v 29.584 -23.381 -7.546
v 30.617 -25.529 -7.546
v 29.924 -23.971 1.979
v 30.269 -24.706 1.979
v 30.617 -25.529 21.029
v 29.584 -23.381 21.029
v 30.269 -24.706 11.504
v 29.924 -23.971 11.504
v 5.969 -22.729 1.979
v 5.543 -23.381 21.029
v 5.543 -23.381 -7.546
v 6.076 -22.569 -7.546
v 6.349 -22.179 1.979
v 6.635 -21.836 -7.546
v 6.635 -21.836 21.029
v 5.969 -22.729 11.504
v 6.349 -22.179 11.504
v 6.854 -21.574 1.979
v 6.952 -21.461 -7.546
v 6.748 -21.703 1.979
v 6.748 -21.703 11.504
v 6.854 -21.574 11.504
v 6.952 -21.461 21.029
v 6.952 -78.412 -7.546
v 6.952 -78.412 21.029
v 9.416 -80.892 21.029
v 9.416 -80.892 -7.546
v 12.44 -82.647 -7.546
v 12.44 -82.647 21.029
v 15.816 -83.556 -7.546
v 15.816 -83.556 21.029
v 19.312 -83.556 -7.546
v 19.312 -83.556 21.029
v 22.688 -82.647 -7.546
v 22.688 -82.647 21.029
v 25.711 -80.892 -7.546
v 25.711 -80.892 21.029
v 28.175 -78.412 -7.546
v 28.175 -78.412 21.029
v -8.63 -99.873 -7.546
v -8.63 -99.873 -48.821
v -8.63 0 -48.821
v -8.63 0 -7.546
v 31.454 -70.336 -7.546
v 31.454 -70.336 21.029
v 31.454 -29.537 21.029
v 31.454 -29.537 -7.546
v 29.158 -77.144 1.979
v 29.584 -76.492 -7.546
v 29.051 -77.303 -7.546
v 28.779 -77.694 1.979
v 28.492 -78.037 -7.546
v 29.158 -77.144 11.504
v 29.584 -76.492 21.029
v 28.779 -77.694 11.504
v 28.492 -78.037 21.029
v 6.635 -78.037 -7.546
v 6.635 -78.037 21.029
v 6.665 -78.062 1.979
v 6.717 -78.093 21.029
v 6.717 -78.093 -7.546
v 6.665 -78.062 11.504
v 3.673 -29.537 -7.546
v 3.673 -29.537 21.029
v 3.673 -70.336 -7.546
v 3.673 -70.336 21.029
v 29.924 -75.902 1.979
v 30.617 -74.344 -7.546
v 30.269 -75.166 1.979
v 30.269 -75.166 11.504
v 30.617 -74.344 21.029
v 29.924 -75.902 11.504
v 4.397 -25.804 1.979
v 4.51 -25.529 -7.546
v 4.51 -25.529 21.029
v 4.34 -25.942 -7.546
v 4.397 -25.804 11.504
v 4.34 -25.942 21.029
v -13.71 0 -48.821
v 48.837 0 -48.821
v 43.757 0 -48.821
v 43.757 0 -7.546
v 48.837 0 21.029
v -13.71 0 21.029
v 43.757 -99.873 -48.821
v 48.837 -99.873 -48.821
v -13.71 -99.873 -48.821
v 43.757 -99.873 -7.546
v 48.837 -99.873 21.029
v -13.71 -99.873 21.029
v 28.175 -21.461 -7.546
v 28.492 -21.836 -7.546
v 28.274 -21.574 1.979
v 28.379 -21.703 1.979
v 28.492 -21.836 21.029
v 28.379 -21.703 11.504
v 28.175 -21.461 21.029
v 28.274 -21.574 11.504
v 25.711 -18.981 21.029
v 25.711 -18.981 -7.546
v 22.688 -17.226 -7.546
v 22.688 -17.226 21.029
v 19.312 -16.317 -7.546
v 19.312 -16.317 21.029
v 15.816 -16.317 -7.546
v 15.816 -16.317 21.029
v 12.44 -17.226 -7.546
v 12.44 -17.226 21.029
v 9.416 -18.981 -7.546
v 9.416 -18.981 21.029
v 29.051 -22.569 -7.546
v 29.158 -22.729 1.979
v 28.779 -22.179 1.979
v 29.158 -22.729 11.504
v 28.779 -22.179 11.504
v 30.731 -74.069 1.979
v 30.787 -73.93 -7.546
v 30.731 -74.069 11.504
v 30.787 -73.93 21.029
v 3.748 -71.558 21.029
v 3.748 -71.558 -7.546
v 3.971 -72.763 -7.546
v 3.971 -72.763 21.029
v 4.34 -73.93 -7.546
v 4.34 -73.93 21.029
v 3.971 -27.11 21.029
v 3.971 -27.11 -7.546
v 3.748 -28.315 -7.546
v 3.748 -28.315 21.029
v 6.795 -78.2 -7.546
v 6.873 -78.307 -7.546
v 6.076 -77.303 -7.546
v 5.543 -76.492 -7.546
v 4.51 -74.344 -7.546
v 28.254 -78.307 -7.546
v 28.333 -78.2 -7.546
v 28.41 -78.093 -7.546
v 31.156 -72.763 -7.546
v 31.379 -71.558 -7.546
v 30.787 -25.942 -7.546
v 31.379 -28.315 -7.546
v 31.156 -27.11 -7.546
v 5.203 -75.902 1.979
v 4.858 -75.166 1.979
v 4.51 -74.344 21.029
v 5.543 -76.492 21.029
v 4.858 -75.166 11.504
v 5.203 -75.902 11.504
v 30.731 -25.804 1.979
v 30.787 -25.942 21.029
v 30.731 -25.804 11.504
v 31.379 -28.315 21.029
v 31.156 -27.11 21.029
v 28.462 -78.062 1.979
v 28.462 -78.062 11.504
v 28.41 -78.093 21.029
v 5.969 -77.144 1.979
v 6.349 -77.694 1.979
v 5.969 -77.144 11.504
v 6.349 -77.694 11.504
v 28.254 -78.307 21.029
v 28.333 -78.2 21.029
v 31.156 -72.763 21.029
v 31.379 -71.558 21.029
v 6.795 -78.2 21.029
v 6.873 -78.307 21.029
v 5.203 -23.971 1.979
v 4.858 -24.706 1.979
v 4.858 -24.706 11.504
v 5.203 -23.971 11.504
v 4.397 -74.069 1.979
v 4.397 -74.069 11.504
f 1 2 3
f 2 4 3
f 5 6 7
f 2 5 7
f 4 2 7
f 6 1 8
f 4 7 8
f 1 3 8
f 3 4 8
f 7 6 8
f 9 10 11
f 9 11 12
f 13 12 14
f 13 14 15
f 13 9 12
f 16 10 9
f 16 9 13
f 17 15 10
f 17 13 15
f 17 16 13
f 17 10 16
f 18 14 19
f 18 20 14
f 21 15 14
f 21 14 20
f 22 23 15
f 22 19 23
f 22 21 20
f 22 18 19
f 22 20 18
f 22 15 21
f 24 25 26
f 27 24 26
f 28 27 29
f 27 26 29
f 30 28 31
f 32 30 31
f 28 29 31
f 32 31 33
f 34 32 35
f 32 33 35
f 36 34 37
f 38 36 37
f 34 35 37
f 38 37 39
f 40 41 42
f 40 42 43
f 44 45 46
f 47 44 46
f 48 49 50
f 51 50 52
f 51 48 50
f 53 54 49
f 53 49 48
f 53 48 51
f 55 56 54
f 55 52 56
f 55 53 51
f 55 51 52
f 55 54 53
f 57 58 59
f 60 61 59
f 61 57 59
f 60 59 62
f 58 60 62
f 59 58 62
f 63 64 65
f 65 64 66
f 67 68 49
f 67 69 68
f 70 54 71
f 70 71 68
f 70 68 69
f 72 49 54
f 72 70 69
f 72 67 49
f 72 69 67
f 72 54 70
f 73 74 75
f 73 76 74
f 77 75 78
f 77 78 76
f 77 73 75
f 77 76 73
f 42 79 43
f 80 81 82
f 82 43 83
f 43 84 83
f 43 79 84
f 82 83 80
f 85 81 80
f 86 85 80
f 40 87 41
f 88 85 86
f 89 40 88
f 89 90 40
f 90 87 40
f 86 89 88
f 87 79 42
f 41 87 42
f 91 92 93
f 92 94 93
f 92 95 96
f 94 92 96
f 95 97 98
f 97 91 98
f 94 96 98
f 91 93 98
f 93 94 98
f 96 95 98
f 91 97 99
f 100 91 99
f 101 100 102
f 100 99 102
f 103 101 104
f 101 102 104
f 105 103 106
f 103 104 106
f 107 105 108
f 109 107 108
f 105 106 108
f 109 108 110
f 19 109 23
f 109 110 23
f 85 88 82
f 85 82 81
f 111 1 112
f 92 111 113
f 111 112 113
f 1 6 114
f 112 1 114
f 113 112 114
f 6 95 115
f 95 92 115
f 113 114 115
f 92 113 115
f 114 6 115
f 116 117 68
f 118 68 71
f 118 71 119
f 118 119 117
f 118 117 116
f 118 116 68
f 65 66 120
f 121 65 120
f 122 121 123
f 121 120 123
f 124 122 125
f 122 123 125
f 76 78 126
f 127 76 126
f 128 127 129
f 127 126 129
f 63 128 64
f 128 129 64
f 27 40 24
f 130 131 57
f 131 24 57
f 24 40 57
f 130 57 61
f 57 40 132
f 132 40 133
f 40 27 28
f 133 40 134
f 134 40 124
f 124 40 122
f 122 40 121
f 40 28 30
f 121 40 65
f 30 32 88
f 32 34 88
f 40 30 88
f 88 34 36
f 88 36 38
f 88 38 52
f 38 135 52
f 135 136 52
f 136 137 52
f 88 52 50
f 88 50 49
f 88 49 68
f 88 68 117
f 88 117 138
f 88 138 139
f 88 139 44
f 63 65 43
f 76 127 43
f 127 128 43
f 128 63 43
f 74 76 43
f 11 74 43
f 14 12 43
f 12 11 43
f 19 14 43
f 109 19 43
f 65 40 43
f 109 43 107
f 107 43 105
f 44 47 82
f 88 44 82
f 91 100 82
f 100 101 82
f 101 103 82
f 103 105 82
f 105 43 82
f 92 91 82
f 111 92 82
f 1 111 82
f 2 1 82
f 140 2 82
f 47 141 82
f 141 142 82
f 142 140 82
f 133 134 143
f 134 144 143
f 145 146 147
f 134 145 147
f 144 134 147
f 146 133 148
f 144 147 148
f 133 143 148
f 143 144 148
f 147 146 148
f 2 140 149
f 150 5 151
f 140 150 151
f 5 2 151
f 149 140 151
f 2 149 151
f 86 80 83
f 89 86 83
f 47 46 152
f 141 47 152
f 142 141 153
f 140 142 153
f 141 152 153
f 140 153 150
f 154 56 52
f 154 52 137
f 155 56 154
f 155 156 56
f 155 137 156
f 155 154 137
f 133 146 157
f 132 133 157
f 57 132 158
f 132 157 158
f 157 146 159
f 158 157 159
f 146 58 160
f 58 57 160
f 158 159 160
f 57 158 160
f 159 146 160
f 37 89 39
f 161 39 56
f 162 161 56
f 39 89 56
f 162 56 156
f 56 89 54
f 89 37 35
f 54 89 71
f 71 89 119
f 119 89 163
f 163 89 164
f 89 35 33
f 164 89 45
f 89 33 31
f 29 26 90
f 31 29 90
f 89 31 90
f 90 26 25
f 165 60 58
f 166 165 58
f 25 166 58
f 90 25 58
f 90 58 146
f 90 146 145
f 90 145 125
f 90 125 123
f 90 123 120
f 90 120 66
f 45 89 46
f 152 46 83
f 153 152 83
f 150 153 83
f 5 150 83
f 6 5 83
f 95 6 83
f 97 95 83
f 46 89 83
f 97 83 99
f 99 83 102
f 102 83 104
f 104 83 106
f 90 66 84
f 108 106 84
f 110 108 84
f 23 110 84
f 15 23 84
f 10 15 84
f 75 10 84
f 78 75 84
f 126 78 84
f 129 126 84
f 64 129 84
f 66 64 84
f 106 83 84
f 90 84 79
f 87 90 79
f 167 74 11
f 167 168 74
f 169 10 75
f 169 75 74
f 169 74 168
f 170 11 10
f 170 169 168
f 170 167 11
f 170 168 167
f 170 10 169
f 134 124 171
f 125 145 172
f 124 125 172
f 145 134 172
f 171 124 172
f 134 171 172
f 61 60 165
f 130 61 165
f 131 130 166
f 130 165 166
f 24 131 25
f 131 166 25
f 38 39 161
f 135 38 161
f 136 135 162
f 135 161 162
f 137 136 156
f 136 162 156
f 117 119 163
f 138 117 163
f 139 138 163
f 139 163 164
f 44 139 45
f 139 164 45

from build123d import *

# Parameters (mm, degrees)
F1_DEPTH = 99.8728
F3_DEPTH = 76.2


with BuildPart() as f1:
    # F0 (on Front) → F1 (new body)
    with BuildSketch(Plane.XZ):
        Polygon((-13.7100952876, 21.0289580073), (-13.7100952876, -48.8210419927), (-8.6300952876, -48.8210419927), (-8.6300952876, -7.5460419927), (43.7574047124, -7.5460419927), (43.7574047124, -48.8210419927), (48.8374047124, -48.8210419927), (48.8374047124, 21.0289580073), align=None)
    extrude(amount=F1_DEPTH)

    # F2 (on face) → F3 (cut)
    with BuildSketch(Plane.XY.offset(21.0289580073)):
        with BuildLine():
            Line((4.2286547124, -29.537025), (17.5636547124, -29.537025))
            Line((17.5636547124, -29.537025), (30.8986547124, -29.537025))
            ThreePointArc((30.8986547124, -29.537025), (30.5444686783, -26.4840438695), (29.5007253861, -23.5932409585))
            ThreePointArc((29.5007253861, -23.5932409585), (29.3257485393, -23.2540819151), (29.1411379191, -22.9200689325))
            ThreePointArc((29.1411379191, -22.9200689325), (28.7900449027, -22.3404710819), (28.4099613701, -21.7794572827))
            ThreePointArc((28.4099613701, -21.7794572827), (28.2935993518, -21.6192909152), (28.1748723712, -21.4608696772))
            ThreePointArc((28.1748723712, -21.4608696772), (17.5636547124, -16.202025), (6.9524370537, -21.4608696772))
            ThreePointArc((6.9524370537, -21.4608696772), (6.8337100731, -21.6192909152), (6.7173480548, -21.7794572827))
            ThreePointArc((6.7173480548, -21.7794572827), (6.3372645222, -22.3404710819), (5.9861715058, -22.9200689325))
            ThreePointArc((5.9861715058, -22.9200689325), (5.8015608856, -23.2540819151), (5.6265840388, -23.5932409585))
            ThreePointArc((5.6265840388, -23.5932409585), (4.5828407466, -26.4840438695), (4.2286547124, -29.537025))
        make_face()
        with BuildLine():
            add(Edge.make_bspline(
                [(6.6348823897, -21.8360589756), (6.6668516864, -21.8071087152), (6.6945437494, -21.7877762741), (6.7173480548, -21.7794572827)],
                knots=[0.7224537776, 0.7224537776, 0.7224537776, 0.7224537776, 0.8255541705, 0.8255541705, 0.8255541705, 0.8255541705], degree=3))
            ThreePointArc((6.7173480548, -21.7794572827), (6.8337100731, -21.6192909152), (6.9524370537, -21.4608696772))
            add(Edge.make_bspline(
                [(6.6348823897, -21.8360589756), (6.7514261553, -21.704238762), (6.8571022341, -21.5633194399), (6.9524370537, -21.4608696772)],
                knots=[0, 0, 0, 0, 0.5726806258, 0.5726806258, 0.5726806258, 0.5726806258], degree=3))
        make_face()
        with BuildLine():
            add(Edge.make_bspline(
                [(5.5428300794, -23.381213264), (5.6933813757, -23.1581826967), (5.8415011899, -22.996565798), (5.9861715058, -22.9200689325)],
                knots=[0.5000098323, 0.5000098323, 0.5000098323, 0.5000098323, 0.6927963918, 0.6927963918, 0.6927963918, 0.6927963918], degree=3))
            ThreePointArc((5.9861715058, -22.9200689325), (6.3372645222, -22.3404710819), (6.7173480548, -21.7794572827))
            add(Edge.make_bspline(
                [(6.6348823897, -21.8360589756), (6.6668516864, -21.8071087152), (6.6945437494, -21.7877762741), (6.7173480548, -21.7794572827)],
                knots=[0.7224537776, 0.7224537776, 0.7224537776, 0.7224537776, 0.8255541705, 0.8255541705, 0.8255541705, 0.8255541705], degree=3))
            add(Edge.make_bspline(
                [(5.5428300794, -23.381213264), (5.9768256033, -22.7140388873), (6.410864435, -22.0389216841), (6.6348823897, -21.8360589756)],
                knots=[0, 0, 0, 0, 0.7224537776, 0.7224537776, 0.7224537776, 0.7224537776], degree=3))
        make_face()
        with BuildLine():
            ThreePointArc((4.5098534254, -25.5285542738), (5.0140987543, -24.5296688557), (5.6265840388, -23.5932409585))
            ThreePointArc((5.6265840388, -23.5932409585), (5.8015608856, -23.2540819151), (5.9861715058, -22.9200689325))
            add(Edge.make_bspline(
                [(5.5428300794, -23.381213264), (5.6933813757, -23.1581826967), (5.8415011899, -22.996565798), (5.9861715058, -22.9200689325)],
                knots=[0.5000098323, 0.5000098323, 0.5000098323, 0.5000098323, 0.6927963918, 0.6927963918, 0.6927963918, 0.6927963918], degree=3))
            add(Edge.make_bspline(
                [(4.5098534254, -25.5285542738), (4.8587454794, -24.6825669454), (5.2068428285, -23.8789534298), (5.5428300794, -23.381213264)],
                knots=[0.0697656051, 0.0697656051, 0.0697656051, 0.0697656051, 0.5000098323, 0.5000098323, 0.5000098323, 0.5000098323], degree=3))
        make_face()
        with BuildLine():
            Line((3.6730297124, -29.537025), (4.2286547124, -29.537025))
            ThreePointArc((4.2286547124, -29.537025), (4.5828407466, -26.4840438695), (5.6265840388, -23.5932409585))
            ThreePointArc((5.6265840388, -23.5932409585), (5.0140987543, -24.5296688557), (4.5098534254, -25.5285542738))
            add(Edge.make_bspline(
                [(4.3401167851, -25.9423127165), (4.3966843979, -25.8040280443), (4.4532793595, -25.6657340757), (4.5098534254, -25.5285542738)],
                knots=[0, 0, 0, 0, 0.0697656051, 0.0697656051, 0.0697656051, 0.0697656051], degree=3))
            ThreePointArc((4.3401167851, -25.9423127165), (3.8412130947, -27.708982224), (3.6730297124, -29.537025))
        make_face()
        with BuildLine():
            ThreePointArc((28.1748723712, -21.4608696772), (28.2935993518, -21.6192909152), (28.4099613701, -21.7794572827))
            add(Edge.make_bspline(
                [(28.4924270351, -21.8360589756), (28.4604577384, -21.8071087152), (28.4327656754, -21.7877762741), (28.4099613701, -21.7794572827)],
                knots=[0.7224537776, 0.7224537776, 0.7224537776, 0.7224537776, 0.8255541705, 0.8255541705, 0.8255541705, 0.8255541705], degree=3))
            add(Edge.make_bspline(
                [(28.4924270351, -21.8360589756), (28.3758832696, -21.704238762), (28.2702071908, -21.5633194399), (28.1748723712, -21.4608696772)],
                knots=[0, 0, 0, 0, 0.5726806258, 0.5726806258, 0.5726806258, 0.5726806258], degree=3))
        make_face()
        with BuildLine():
            ThreePointArc((28.4099613701, -21.7794572827), (28.7900449027, -22.3404710819), (29.1411379191, -22.9200689325))
            add(Edge.make_bspline(
                [(29.5844793455, -23.381213264), (29.4339280492, -23.1581826967), (29.2858082349, -22.996565798), (29.1411379191, -22.9200689325)],
                knots=[0.5000098323, 0.5000098323, 0.5000098323, 0.5000098323, 0.6927963918, 0.6927963918, 0.6927963918, 0.6927963918], degree=3))
            add(Edge.make_bspline(
                [(29.5844793455, -23.381213264), (29.1504838216, -22.7140388873), (28.7164449899, -22.0389216841), (28.4924270351, -21.8360589756)],
                knots=[0, 0, 0, 0, 0.7224537776, 0.7224537776, 0.7224537776, 0.7224537776], degree=3))
            add(Edge.make_bspline(
                [(28.4924270351, -21.8360589756), (28.4604577384, -21.8071087152), (28.4327656754, -21.7877762741), (28.4099613701, -21.7794572827)],
                knots=[0.7224537776, 0.7224537776, 0.7224537776, 0.7224537776, 0.8255541705, 0.8255541705, 0.8255541705, 0.8255541705], degree=3))
        make_face()
        with BuildLine():
            ThreePointArc((29.5007253861, -23.5932409585), (30.5444686783, -26.4840438695), (30.8986547124, -29.537025))
            Line((30.8986547124, -29.537025), (31.4542797124, -29.537025))
            ThreePointArc((31.4542797124, -29.537025), (31.2860963302, -27.708982224), (30.7871926398, -25.9423127165))
            add(Edge.make_bspline(
                [(30.7871926398, -25.9423127165), (30.730625027, -25.8040280443), (30.6740300653, -25.6657340757), (30.6174559995, -25.5285542738)],
                knots=[0, 0, 0, 0, 0.0697656051, 0.0697656051, 0.0697656051, 0.0697656051], degree=3))
            ThreePointArc((30.6174559995, -25.5285542738), (30.1132106705, -24.5296688557), (29.5007253861, -23.5932409585))
        make_face()
        with BuildLine():
            ThreePointArc((29.1411379191, -22.9200689325), (29.3257485393, -23.2540819151), (29.5007253861, -23.5932409585))
            ThreePointArc((29.5007253861, -23.5932409585), (30.1132106705, -24.5296688557), (30.6174559995, -25.5285542738))
            add(Edge.make_bspline(
                [(30.6174559995, -25.5285542738), (30.2685639455, -24.6825669454), (29.9204665964, -23.8789534298), (29.5844793455, -23.381213264)],
                knots=[0.0697656051, 0.0697656051, 0.0697656051, 0.0697656051, 0.5000098323, 0.5000098323, 0.5000098323, 0.5000098323], degree=3))
            add(Edge.make_bspline(
                [(29.5844793455, -23.381213264), (29.4339280492, -23.1581826967), (29.2858082349, -22.996565798), (29.1411379191, -22.9200689325)],
                knots=[0.5000098323, 0.5000098323, 0.5000098323, 0.5000098323, 0.6927963918, 0.6927963918, 0.6927963918, 0.6927963918], degree=3))
        make_face()
        with BuildLine():
            ThreePointArc((4.2286547124, -29.537025), (8.1343857853, -38.9662939271), (17.5636547124, -42.872025))
            Line((17.5636547124, -42.872025), (17.5636547124, -29.537025))
            Line((17.5636547124, -29.537025), (4.2286547124, -29.537025))
        make_face()
        with BuildLine():
            Line((17.5636547124, -29.537025), (17.5636547124, -42.872025))
            ThreePointArc((17.5636547124, -42.872025), (26.9929236395, -38.9662939271), (30.8986547124, -29.537025))
            Line((30.8986547124, -29.537025), (17.5636547124, -29.537025))
        make_face()
        with BuildLine():
            Line((17.5636547124, -57.000775), (17.5636547124, -49.9364))
            Line((17.5636547124, -49.9364), (17.5636547124, -42.872025))
            ThreePointArc((17.5636547124, -42.872025), (8.1343857853, -38.9662939271), (4.2286547124, -29.537025))
            Line((4.2286547124, -29.537025), (3.6730297124, -29.537025))
            Line((3.6730297124, -29.537025), (3.6730297124, -70.335775))
            ThreePointArc((3.6730297124, -70.335775), (3.8412130947, -72.163817776), (4.3401167851, -73.9304872835))
            add(Edge.make_bspline(
                [(4.3401167851, -73.9304872835), (4.3966843979, -74.0687719557), (4.4532793595, -74.2070659243), (4.5098534254, -74.3442457262)],
                knots=[0, 0, 0, 0, 0.0697656051, 0.0697656051, 0.0697656051, 0.0697656051], degree=3))
            ThreePointArc((4.5098534254, -74.3442457262), (5.0140987543, -75.3431311443), (5.6265840388, -76.2795590415))
            ThreePointArc((5.6265840388, -76.2795590415), (6.2260494716, -63.3157370796), (17.5636547124, -57.000775))
        make_face()
        with BuildLine():
            Line((17.5636547124, -42.872025), (17.5636547124, -49.9364))
            Line((17.5636547124, -49.9364), (31.4542797124, -49.9364))
            Line((31.4542797124, -49.9364), (31.4542797124, -29.537025))
            Line((31.4542797124, -29.537025), (30.8986547124, -29.537025))
            ThreePointArc((30.8986547124, -29.537025), (26.9929236395, -38.9662939271), (17.5636547124, -42.872025))
        make_face()
        with BuildLine():
            Line((31.4542797124, -49.9364), (17.5636547124, -49.9364))
            Line((17.5636547124, -49.9364), (17.5636547124, -57.000775))
            ThreePointArc((17.5636547124, -57.000775), (26.9929236395, -60.9065060729), (30.8986547124, -70.335775))
            Line((30.8986547124, -70.335775), (31.4542797124, -70.335775))
            Line((31.4542797124, -70.335775), (31.4542797124, -49.9364))
        make_face()
        with BuildLine():
            Line((17.5636547124, -68.4276), (17.5636547124, -57.000775))
            ThreePointArc((17.5636547124, -57.000775), (6.2260494716, -63.3157370796), (5.6265840388, -76.2795590415))
            ThreePointArc((5.6265840388, -76.2795590415), (5.8015608856, -76.6187180849), (5.9861715058, -76.9527310675))
            ThreePointArc((5.9861715058, -76.9527310675), (6.3372645222, -77.5323289181), (6.7173480548, -78.0933427173))
            ThreePointArc((6.7173480548, -78.0933427173), (6.8337100731, -78.2535090848), (6.9524370537, -78.4119303228))
            ThreePointArc((6.9524370537, -78.4119303228), (17.5636547124, -83.670775), (28.1748723712, -78.4119303228))
            ThreePointArc((28.1748723712, -78.4119303228), (28.2935993518, -78.2535090848), (28.4099613701, -78.0933427173))
            ThreePointArc((28.4099613701, -78.0933427173), (28.7900449027, -77.5323289181), (29.1411379191, -76.9527310675))
            ThreePointArc((29.1411379191, -76.9527310675), (29.3257485393, -76.6187180849), (29.5007253861, -76.2795590415))
            ThreePointArc((29.5007253861, -76.2795590415), (30.5444686783, -73.3887561305), (30.8986547124, -70.335775))
            Line((30.8986547124, -70.335775), (17.5636547124, -70.335775))
            Line((17.5636547124, -70.335775), (17.5636547124, -68.4276))
        make_face()
        with BuildLine():
            ThreePointArc((30.8986547124, -70.335775), (26.9929236395, -60.9065060729), (17.5636547124, -57.000775))
            Line((17.5636547124, -57.000775), (17.5636547124, -68.4276))
            Line((17.5636547124, -68.4276), (17.5636547124, -70.335775))
            Line((17.5636547124, -70.335775), (30.8986547124, -70.335775))
        make_face()
        with BuildLine():
            Line((31.4542797124, -70.335775), (30.8986547124, -70.335775))
            ThreePointArc((30.8986547124, -70.335775), (30.5444686783, -73.3887561305), (29.5007253861, -76.2795590415))
            ThreePointArc((29.5007253861, -76.2795590415), (30.1132106705, -75.3431311443), (30.6174559995, -74.3442457262))
            add(Edge.make_bspline(
                [(30.7871926398, -73.9304872835), (30.730625027, -74.0687719557), (30.6740300653, -74.2070659243), (30.6174559995, -74.3442457262)],
                knots=[0, 0, 0, 0, 0.0697656051, 0.0697656051, 0.0697656051, 0.0697656051], degree=3))
            ThreePointArc((30.7871926398, -73.9304872835), (31.2860963302, -72.163817776), (31.4542797124, -70.335775))
        make_face()
        with BuildLine():
            ThreePointArc((30.6174559995, -74.3442457262), (30.1132106705, -75.3431311443), (29.5007253861, -76.2795590415))
            ThreePointArc((29.5007253861, -76.2795590415), (29.3257485393, -76.6187180849), (29.1411379191, -76.9527310675))
            add(Edge.make_bspline(
                [(29.5844793455, -76.491586736), (29.4339280492, -76.7146173033), (29.2858082349, -76.876234202), (29.1411379191, -76.9527310675)],
                knots=[0.5000098323, 0.5000098323, 0.5000098323, 0.5000098323, 0.6927963918, 0.6927963918, 0.6927963918, 0.6927963918], degree=3))
            add(Edge.make_bspline(
                [(30.6174559995, -74.3442457262), (30.2685639455, -75.1902330546), (29.9204665964, -75.9938465702), (29.5844793455, -76.491586736)],
                knots=[0.0697656051, 0.0697656051, 0.0697656051, 0.0697656051, 0.5000098323, 0.5000098323, 0.5000098323, 0.5000098323], degree=3))
        make_face()
        with BuildLine():
            add(Edge.make_bspline(
                [(29.5844793455, -76.491586736), (29.4339280492, -76.7146173033), (29.2858082349, -76.876234202), (29.1411379191, -76.9527310675)],
                knots=[0.5000098323, 0.5000098323, 0.5000098323, 0.5000098323, 0.6927963918, 0.6927963918, 0.6927963918, 0.6927963918], degree=3))
            ThreePointArc((29.1411379191, -76.9527310675), (28.7900449027, -77.5323289181), (28.4099613701, -78.0933427173))
            add(Edge.make_bspline(
                [(28.4924270351, -78.0367410244), (28.4604577384, -78.0656912848), (28.4327656754, -78.0850237259), (28.4099613701, -78.0933427173)],
                knots=[0.7224537776, 0.7224537776, 0.7224537776, 0.7224537776, 0.8255541705, 0.8255541705, 0.8255541705, 0.8255541705], degree=3))
            add(Edge.make_bspline(
                [(29.5844793455, -76.491586736), (29.1504838216, -77.1587611127), (28.7164449899, -77.8338783159), (28.4924270351, -78.0367410244)],
                knots=[0, 0, 0, 0, 0.7224537776, 0.7224537776, 0.7224537776, 0.7224537776], degree=3))
        make_face()
        with BuildLine():
            ThreePointArc((5.9861715058, -76.9527310675), (5.8015608856, -76.6187180849), (5.6265840388, -76.2795590415))
            ThreePointArc((5.6265840388, -76.2795590415), (5.0140987543, -75.3431311443), (4.5098534254, -74.3442457262))
            add(Edge.make_bspline(
                [(4.5098534254, -74.3442457262), (4.8587454794, -75.1902330546), (5.2068428285, -75.9938465702), (5.5428300794, -76.491586736)],
                knots=[0.0697656051, 0.0697656051, 0.0697656051, 0.0697656051, 0.5000098323, 0.5000098323, 0.5000098323, 0.5000098323], degree=3))
            add(Edge.make_bspline(
                [(5.5428300794, -76.491586736), (5.6933813757, -76.7146173033), (5.8415011899, -76.876234202), (5.9861715058, -76.9527310675)],
                knots=[0.5000098323, 0.5000098323, 0.5000098323, 0.5000098323, 0.6927963918, 0.6927963918, 0.6927963918, 0.6927963918], degree=3))
        make_face()
        with BuildLine():
            ThreePointArc((6.7173480548, -78.0933427173), (6.3372645222, -77.5323289181), (5.9861715058, -76.9527310675))
            add(Edge.make_bspline(
                [(5.5428300794, -76.491586736), (5.6933813757, -76.7146173033), (5.8415011899, -76.876234202), (5.9861715058, -76.9527310675)],
                knots=[0.5000098323, 0.5000098323, 0.5000098323, 0.5000098323, 0.6927963918, 0.6927963918, 0.6927963918, 0.6927963918], degree=3))
            add(Edge.make_bspline(
                [(5.5428300794, -76.491586736), (5.9768256033, -77.1587611127), (6.410864435, -77.8338783159), (6.6348823897, -78.0367410244)],
                knots=[0, 0, 0, 0, 0.7224537776, 0.7224537776, 0.7224537776, 0.7224537776], degree=3))
            add(Edge.make_bspline(
                [(6.6348823897, -78.0367410244), (6.6668516864, -78.0656912848), (6.6945437494, -78.0850237259), (6.7173480548, -78.0933427173)],
                knots=[0.7224537776, 0.7224537776, 0.7224537776, 0.7224537776, 0.8255541705, 0.8255541705, 0.8255541705, 0.8255541705], degree=3))
        make_face()
    extrude(amount=-F3_DEPTH, mode=Mode.SUBTRACT)


solid = f1.part
